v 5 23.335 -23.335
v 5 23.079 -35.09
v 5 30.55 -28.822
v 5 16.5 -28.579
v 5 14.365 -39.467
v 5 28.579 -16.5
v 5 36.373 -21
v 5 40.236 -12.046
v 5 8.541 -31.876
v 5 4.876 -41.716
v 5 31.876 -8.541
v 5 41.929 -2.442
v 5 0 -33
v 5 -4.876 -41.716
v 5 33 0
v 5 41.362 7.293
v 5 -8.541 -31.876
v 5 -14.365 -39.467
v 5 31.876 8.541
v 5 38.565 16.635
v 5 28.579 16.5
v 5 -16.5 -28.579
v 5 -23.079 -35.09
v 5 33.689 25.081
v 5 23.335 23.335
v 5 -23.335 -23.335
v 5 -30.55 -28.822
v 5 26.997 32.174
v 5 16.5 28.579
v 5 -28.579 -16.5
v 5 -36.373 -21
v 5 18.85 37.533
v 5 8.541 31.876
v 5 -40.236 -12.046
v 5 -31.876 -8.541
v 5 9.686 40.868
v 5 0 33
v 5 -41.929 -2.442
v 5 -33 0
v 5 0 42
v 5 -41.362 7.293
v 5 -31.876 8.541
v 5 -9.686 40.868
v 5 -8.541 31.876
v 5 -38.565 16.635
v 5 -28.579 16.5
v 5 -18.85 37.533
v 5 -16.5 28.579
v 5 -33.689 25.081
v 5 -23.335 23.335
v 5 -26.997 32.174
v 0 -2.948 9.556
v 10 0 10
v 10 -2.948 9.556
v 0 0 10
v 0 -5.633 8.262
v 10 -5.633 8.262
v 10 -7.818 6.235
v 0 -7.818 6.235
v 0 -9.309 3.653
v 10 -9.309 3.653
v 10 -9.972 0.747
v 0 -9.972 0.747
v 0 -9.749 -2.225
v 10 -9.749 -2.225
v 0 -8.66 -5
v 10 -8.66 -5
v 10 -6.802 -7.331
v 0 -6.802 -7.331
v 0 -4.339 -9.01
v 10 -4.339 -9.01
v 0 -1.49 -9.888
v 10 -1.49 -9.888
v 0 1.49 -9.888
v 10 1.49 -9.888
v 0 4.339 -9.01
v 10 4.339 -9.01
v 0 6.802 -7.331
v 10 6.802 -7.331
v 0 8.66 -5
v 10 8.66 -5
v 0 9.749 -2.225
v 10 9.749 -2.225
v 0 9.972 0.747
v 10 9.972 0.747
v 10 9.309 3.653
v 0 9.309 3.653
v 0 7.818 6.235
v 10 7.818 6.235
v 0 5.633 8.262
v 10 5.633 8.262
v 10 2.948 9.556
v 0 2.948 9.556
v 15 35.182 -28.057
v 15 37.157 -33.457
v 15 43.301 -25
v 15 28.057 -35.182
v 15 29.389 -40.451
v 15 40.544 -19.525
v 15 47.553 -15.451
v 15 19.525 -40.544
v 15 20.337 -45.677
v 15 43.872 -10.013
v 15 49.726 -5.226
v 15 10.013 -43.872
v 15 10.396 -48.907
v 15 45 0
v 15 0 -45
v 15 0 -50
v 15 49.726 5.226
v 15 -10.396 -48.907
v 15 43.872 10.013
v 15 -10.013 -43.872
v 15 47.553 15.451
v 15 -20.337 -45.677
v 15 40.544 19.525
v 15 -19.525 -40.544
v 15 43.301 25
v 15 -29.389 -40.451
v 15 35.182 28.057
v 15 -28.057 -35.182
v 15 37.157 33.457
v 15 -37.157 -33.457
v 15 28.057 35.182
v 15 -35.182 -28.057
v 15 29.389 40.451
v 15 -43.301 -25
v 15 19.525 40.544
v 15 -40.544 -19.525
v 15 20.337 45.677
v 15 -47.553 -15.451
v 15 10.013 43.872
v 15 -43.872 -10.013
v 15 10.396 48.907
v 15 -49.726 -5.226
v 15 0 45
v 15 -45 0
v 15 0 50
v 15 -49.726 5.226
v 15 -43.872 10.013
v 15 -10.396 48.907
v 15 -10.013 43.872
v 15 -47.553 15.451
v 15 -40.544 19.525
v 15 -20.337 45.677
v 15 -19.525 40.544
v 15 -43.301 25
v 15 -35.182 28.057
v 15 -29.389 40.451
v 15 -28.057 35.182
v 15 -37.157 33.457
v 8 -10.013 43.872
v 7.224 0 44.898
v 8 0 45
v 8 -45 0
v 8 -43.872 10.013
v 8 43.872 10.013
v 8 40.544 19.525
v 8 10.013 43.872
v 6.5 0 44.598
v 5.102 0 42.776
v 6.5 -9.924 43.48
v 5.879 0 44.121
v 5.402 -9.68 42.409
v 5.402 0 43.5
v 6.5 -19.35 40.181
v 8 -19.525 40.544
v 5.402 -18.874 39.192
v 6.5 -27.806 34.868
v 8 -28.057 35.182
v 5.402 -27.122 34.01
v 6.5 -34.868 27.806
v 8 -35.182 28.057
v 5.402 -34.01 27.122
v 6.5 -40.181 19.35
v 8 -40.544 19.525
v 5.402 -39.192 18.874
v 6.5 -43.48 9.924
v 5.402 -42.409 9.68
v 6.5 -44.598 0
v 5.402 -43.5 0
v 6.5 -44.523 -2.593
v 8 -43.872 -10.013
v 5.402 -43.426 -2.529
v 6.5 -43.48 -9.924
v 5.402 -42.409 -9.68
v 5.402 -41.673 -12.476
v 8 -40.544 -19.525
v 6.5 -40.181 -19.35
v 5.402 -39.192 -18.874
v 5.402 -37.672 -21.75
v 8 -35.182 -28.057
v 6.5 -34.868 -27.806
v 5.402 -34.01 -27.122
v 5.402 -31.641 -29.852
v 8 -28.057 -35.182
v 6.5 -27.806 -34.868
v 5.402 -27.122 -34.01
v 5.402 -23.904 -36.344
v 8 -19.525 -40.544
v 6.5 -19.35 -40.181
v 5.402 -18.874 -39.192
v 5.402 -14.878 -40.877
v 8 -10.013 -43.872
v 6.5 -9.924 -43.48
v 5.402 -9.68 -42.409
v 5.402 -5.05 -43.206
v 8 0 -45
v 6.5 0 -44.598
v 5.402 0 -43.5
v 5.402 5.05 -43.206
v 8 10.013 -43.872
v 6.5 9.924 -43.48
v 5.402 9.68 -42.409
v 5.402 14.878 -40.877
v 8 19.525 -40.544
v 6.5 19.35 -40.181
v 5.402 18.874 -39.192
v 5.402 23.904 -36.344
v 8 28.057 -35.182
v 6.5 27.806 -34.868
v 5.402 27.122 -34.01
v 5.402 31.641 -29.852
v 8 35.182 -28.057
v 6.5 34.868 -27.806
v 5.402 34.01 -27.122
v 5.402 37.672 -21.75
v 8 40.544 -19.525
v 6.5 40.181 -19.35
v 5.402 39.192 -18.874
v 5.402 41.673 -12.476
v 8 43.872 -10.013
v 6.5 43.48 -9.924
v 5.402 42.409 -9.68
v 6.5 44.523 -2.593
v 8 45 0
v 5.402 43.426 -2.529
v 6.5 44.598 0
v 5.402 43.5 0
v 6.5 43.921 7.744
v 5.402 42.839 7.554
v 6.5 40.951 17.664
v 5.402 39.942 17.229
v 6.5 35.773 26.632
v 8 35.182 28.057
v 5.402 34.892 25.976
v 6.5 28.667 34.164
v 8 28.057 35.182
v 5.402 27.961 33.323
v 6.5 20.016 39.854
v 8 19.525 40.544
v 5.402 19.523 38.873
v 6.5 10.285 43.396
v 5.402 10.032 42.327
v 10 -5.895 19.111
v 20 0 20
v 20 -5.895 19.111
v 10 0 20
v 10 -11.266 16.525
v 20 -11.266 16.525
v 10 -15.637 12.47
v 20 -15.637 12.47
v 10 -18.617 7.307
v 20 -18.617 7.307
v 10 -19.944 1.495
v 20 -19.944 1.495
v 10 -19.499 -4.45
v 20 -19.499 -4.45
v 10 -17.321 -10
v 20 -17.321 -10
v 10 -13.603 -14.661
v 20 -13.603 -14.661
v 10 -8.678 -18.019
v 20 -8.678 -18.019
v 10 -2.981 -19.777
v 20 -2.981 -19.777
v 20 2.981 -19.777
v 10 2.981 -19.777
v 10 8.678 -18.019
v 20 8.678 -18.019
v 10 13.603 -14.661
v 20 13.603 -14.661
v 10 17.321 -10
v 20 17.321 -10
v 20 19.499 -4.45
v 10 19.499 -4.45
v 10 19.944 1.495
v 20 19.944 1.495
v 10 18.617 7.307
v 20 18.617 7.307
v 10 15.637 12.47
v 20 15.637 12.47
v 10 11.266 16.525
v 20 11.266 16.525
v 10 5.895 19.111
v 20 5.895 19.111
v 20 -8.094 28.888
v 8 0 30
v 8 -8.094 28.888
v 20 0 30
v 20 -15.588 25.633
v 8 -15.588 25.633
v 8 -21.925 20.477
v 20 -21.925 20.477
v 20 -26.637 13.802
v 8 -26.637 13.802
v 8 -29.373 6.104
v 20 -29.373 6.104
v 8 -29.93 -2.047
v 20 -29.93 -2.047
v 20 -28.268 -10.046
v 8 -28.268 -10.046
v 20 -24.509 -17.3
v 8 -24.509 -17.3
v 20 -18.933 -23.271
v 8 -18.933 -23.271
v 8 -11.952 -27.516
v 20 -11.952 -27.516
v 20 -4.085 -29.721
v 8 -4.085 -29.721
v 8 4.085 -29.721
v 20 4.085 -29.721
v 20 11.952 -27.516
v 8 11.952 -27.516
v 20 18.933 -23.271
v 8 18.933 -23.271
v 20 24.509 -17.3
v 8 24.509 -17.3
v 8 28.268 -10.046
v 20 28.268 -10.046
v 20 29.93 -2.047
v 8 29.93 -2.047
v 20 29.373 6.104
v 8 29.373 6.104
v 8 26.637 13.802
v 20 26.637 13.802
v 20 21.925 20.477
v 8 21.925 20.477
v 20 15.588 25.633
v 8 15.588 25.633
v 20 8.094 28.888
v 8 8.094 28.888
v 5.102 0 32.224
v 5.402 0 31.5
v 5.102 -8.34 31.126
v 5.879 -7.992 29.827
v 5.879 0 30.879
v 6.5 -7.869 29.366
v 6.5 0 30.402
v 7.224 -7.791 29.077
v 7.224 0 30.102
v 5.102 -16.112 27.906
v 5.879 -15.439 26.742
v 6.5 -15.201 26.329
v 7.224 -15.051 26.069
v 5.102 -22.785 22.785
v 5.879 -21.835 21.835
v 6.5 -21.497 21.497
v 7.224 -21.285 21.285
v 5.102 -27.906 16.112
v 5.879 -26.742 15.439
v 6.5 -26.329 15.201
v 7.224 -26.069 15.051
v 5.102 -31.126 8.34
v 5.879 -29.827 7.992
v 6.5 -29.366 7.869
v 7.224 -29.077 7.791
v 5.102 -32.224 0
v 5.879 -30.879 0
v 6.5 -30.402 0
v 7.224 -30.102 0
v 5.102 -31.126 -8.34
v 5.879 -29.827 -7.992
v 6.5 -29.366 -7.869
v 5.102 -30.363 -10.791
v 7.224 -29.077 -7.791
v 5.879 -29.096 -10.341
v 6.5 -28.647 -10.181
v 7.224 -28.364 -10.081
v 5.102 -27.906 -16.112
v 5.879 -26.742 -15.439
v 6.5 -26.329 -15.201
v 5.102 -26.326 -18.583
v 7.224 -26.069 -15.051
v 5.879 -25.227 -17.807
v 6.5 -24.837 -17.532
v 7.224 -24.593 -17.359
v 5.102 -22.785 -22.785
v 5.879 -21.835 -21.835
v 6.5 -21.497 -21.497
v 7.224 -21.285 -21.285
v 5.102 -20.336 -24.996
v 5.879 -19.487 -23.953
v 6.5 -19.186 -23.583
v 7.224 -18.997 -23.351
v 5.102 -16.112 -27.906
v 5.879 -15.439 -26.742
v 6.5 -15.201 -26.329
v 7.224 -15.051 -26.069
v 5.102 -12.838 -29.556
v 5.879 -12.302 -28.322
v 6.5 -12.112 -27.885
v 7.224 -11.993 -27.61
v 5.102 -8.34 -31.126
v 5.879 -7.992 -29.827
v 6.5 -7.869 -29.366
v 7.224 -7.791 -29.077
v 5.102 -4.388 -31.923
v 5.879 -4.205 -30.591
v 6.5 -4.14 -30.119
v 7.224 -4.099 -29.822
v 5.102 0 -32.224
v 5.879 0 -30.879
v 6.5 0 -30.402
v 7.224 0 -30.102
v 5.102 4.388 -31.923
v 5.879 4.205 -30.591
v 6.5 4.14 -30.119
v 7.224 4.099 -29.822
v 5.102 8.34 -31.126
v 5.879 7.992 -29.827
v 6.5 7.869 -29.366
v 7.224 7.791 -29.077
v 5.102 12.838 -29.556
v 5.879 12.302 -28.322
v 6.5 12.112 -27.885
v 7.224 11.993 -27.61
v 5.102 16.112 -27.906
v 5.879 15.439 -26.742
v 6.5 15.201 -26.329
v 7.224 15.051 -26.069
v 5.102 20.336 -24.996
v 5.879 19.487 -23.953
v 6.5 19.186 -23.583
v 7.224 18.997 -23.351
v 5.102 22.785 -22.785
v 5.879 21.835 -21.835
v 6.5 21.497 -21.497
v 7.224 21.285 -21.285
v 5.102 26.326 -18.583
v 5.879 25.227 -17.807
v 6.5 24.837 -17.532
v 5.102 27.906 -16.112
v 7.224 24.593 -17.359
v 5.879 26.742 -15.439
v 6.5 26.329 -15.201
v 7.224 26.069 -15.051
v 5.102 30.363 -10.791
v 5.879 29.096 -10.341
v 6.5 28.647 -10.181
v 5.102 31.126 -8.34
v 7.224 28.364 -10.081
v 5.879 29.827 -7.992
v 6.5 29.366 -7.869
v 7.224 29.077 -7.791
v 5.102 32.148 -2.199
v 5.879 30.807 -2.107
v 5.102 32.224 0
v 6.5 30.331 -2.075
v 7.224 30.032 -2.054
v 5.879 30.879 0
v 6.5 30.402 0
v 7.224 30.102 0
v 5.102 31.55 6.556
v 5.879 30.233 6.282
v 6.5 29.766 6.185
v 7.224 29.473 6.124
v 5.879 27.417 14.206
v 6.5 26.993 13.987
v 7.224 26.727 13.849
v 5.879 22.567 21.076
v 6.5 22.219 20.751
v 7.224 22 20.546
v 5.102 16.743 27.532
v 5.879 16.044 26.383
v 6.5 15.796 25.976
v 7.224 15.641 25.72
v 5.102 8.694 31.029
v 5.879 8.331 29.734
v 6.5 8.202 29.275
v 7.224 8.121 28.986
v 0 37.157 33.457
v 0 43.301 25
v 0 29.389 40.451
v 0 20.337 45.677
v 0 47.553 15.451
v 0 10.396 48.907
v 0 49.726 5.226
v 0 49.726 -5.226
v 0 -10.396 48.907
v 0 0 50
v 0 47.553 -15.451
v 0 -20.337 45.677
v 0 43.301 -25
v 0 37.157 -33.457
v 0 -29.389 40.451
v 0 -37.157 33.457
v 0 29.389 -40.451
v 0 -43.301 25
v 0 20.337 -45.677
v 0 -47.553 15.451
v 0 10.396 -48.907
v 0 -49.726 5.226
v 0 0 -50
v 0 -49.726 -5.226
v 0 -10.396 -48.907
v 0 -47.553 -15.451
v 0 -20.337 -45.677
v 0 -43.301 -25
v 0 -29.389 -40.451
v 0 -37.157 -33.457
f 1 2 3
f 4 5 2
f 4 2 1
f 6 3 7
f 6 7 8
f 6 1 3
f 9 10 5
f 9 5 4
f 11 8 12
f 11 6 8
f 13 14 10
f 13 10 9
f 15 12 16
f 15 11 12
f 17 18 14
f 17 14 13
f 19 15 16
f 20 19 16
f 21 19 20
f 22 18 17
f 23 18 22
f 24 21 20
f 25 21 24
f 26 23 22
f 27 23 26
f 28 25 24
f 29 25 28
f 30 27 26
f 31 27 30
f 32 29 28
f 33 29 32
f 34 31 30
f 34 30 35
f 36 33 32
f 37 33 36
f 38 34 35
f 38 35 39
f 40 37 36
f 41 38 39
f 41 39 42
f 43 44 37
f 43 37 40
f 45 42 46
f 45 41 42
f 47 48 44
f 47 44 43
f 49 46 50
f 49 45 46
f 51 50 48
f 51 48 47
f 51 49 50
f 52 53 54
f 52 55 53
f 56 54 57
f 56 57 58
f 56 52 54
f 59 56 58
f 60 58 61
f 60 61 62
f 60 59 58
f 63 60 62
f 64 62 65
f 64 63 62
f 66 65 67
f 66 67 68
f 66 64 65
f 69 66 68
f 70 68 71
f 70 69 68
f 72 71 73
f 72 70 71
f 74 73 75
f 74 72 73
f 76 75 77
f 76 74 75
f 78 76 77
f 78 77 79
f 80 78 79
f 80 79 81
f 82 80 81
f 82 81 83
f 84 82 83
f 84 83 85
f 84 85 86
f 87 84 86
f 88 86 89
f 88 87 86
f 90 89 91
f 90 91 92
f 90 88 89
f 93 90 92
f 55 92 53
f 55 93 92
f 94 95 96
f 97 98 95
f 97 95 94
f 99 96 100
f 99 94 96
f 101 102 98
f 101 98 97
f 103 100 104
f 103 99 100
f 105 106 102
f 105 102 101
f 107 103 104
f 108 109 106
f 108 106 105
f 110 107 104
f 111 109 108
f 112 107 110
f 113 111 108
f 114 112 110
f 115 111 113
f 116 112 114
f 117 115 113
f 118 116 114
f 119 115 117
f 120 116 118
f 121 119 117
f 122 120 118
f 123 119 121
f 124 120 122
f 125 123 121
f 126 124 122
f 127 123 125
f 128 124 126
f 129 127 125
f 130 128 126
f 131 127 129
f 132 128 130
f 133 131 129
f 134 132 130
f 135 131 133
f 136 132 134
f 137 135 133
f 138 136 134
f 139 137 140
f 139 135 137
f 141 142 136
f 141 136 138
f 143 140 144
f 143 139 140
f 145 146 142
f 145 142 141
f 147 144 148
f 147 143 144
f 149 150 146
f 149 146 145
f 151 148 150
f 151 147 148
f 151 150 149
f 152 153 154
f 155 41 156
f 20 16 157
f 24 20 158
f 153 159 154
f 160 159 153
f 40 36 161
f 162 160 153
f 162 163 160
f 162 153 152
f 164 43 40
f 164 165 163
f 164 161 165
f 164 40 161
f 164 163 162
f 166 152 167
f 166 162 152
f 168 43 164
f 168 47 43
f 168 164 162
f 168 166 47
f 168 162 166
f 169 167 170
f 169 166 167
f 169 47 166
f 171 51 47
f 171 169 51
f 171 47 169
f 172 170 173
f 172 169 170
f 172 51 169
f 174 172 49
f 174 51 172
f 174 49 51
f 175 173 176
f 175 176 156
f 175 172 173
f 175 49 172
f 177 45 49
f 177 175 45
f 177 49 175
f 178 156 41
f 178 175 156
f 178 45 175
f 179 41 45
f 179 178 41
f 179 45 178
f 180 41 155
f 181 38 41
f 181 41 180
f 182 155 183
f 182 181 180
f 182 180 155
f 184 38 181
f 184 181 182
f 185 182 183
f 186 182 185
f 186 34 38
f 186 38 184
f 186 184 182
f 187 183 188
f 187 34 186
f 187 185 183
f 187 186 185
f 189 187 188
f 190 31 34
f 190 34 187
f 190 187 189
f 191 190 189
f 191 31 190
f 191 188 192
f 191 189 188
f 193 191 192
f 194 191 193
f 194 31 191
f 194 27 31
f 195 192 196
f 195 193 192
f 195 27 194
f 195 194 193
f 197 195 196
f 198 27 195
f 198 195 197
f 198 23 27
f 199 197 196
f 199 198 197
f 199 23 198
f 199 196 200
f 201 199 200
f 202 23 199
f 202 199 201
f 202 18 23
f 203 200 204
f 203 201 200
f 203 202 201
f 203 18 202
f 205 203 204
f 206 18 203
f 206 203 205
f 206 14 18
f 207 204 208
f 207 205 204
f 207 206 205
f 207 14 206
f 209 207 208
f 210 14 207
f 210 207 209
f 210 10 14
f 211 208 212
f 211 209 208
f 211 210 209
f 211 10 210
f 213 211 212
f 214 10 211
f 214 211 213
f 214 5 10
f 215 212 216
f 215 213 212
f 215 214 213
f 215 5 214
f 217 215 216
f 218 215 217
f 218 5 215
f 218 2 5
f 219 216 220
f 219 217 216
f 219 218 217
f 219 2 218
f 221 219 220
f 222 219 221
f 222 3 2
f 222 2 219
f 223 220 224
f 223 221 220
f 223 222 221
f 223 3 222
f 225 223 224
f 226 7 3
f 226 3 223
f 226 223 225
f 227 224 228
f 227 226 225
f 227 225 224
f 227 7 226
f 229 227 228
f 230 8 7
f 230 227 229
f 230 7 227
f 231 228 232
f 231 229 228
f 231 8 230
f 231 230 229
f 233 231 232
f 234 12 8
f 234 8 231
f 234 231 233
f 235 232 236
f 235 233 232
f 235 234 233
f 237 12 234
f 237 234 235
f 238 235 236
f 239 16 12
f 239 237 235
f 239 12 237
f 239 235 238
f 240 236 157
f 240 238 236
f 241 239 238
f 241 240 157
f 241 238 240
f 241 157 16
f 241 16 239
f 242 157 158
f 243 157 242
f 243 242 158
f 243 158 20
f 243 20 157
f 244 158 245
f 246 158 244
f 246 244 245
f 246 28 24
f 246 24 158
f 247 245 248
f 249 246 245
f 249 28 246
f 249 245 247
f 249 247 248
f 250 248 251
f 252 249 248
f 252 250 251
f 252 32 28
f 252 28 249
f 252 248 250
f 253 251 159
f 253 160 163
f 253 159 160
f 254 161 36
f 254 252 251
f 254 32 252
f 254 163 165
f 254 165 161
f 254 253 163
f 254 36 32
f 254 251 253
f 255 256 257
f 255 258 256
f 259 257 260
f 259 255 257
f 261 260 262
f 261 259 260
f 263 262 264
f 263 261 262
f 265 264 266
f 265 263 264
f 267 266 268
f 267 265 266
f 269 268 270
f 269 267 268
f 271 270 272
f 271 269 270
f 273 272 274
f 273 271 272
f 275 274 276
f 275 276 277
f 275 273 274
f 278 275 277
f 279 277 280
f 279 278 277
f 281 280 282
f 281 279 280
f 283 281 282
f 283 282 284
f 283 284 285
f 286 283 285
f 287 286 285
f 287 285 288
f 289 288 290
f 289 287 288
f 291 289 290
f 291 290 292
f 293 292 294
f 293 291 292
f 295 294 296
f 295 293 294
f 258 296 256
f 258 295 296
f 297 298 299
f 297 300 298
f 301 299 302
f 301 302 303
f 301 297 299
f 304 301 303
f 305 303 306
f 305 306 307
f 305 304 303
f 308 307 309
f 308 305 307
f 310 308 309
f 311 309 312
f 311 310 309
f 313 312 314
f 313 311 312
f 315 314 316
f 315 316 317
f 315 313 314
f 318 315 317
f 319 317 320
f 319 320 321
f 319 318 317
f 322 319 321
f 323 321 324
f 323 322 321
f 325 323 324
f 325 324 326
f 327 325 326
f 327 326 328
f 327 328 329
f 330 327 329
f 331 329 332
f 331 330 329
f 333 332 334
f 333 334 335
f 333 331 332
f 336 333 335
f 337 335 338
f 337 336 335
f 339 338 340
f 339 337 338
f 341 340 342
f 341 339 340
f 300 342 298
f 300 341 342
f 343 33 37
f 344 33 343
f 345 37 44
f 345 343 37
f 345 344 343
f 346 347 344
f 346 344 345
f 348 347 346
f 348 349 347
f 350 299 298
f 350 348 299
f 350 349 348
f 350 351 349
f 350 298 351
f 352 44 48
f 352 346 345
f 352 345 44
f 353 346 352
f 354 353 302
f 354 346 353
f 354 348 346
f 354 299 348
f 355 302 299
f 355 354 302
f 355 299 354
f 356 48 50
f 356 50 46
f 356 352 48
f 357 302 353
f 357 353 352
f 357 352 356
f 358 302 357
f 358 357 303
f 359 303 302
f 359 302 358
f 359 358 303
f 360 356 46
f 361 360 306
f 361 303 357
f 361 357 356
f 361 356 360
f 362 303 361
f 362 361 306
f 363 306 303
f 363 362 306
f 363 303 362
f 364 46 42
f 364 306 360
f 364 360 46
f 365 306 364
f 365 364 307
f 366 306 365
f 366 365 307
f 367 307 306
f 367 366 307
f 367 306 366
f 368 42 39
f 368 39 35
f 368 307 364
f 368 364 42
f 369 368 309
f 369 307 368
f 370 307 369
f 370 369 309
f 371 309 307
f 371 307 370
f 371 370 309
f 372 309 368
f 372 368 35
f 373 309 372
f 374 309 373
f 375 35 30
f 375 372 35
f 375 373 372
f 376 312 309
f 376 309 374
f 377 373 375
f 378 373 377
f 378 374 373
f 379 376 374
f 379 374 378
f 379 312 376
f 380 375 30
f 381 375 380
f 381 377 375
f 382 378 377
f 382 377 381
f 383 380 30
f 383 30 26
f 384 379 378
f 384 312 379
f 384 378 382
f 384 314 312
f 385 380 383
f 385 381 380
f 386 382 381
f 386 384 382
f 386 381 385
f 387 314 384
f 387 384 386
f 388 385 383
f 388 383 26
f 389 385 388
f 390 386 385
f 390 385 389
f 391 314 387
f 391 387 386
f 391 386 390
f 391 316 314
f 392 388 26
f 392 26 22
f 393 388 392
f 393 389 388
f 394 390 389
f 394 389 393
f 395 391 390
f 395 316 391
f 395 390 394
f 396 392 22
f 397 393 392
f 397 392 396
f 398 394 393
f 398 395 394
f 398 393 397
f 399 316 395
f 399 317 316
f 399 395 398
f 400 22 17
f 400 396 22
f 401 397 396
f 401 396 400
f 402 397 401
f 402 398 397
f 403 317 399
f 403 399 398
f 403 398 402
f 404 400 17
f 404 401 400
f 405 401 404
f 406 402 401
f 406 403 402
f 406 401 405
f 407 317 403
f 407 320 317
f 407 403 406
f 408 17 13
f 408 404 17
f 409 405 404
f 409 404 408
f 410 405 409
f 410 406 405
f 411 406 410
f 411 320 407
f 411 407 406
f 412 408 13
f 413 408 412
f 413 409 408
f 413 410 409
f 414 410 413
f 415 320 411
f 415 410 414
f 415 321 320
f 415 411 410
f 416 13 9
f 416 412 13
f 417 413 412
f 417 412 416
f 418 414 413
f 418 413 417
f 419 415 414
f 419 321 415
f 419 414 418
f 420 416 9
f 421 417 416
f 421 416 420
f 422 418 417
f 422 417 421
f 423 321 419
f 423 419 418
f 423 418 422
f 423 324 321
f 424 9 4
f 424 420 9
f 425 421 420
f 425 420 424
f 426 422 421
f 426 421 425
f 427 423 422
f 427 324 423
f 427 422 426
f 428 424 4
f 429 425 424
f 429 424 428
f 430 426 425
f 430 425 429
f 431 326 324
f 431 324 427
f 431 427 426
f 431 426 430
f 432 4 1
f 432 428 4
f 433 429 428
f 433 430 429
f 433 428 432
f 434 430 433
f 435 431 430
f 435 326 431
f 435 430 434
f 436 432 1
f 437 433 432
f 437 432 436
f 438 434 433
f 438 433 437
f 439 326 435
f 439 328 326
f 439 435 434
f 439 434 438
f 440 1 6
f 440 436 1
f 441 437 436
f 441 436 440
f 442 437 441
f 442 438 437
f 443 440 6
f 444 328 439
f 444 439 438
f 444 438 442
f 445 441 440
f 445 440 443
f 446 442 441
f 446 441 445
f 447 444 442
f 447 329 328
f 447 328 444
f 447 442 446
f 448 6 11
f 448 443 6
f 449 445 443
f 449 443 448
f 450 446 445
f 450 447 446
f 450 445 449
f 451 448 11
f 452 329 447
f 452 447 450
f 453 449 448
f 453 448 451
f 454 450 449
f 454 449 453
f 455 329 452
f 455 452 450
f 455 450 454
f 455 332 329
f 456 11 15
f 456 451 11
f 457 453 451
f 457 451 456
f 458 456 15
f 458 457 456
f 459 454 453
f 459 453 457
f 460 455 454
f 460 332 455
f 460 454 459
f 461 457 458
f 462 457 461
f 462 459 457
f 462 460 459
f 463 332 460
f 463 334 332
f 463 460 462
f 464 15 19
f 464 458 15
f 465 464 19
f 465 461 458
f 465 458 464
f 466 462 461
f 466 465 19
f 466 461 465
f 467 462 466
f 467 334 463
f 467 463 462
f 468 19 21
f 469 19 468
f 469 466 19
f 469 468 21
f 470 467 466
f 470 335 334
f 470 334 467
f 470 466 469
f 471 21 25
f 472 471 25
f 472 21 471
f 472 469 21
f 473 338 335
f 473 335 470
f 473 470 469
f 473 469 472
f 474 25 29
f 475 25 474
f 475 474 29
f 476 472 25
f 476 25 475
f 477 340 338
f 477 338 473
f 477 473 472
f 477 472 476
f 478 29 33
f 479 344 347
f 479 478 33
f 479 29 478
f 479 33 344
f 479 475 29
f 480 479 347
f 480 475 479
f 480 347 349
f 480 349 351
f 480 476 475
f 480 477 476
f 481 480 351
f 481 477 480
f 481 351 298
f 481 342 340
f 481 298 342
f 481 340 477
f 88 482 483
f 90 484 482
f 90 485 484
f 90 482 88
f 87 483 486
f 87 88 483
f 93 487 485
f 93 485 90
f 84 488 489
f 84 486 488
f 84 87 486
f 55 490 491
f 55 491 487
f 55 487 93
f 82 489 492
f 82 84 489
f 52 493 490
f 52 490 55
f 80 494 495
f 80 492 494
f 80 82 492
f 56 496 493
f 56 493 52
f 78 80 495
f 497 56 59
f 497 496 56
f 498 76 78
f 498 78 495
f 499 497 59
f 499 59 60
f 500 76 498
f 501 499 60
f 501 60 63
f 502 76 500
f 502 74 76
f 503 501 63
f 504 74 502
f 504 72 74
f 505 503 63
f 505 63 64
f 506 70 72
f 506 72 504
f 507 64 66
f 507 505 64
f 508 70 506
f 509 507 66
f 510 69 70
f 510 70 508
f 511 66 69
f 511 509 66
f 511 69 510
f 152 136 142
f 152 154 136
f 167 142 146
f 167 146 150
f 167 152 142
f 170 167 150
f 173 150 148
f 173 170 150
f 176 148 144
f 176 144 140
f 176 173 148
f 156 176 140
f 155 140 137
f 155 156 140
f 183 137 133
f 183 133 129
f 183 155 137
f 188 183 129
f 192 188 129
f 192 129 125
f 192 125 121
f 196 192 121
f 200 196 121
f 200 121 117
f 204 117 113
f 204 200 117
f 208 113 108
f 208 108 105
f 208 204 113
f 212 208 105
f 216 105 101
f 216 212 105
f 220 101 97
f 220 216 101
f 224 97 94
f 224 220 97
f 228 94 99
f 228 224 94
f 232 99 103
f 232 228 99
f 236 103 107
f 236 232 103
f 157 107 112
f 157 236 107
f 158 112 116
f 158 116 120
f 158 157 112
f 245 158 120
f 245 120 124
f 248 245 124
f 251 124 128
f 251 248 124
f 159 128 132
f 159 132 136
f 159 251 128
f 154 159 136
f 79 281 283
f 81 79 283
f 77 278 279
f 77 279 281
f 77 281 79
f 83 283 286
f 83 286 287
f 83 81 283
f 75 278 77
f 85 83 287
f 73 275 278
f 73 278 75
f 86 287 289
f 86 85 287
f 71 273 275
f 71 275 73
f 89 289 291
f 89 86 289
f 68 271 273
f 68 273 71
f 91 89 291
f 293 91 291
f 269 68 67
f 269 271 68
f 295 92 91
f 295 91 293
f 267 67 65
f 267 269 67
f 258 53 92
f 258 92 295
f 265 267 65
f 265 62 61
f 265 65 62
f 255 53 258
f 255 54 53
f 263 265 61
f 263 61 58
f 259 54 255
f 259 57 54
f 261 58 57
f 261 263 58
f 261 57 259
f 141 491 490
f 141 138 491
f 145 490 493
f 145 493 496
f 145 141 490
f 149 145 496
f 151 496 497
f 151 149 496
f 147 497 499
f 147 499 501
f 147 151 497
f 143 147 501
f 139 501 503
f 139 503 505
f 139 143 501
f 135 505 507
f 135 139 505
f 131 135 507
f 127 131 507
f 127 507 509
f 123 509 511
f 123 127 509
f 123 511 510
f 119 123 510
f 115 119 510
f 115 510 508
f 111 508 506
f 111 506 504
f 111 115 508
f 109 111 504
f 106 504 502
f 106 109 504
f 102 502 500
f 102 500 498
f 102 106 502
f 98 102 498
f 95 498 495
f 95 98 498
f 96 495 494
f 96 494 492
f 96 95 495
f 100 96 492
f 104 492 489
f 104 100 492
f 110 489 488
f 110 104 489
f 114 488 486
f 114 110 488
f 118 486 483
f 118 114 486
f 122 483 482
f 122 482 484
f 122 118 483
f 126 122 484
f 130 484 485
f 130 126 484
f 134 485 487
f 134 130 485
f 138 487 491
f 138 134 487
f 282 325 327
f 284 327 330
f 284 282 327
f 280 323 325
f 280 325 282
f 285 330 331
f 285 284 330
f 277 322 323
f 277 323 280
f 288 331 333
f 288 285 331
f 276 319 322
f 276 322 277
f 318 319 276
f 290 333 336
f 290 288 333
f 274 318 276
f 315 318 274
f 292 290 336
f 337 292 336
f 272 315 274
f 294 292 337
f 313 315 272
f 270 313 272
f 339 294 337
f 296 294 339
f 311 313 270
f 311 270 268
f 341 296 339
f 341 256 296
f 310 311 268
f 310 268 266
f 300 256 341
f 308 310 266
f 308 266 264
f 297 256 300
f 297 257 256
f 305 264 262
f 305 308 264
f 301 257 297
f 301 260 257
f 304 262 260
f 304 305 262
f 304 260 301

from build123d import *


with BuildPart() as part:
    # Croquis1 → Revolución1 (revolve)
    with BuildSketch(Plane.XY, mode=Mode.PRIVATE) as revoluci_n1_sk:
        with BuildLine():
            Line((0, 10), (0, 50))
            Line((0, 50), (15, 50))
            Line((15, 50), (15, 45))
            Line((15, 45), (8, 45))
            ThreePointArc((8, 45), (5.878679656, 44.121320344), (5, 42))
            Line((5, 42), (5, 33))
            ThreePointArc((5, 33), (5.878679656, 30.878679656), (8, 30))
            Line((8, 30), (20, 30))
            Line((20, 30), (20, 20))
            Line((20, 20), (10, 20))
            Line((10, 20), (10, 10))
            Line((10, 10), (0, 10))
        make_face()
    revolve(revoluci_n1_sk.sketch.rotate(Axis((-16.484758047, 0, 0), (1, 0, 0)), 90), axis=Axis((-16.484758047, 0, 0), (1, 0, 0)))


solid = part.part
